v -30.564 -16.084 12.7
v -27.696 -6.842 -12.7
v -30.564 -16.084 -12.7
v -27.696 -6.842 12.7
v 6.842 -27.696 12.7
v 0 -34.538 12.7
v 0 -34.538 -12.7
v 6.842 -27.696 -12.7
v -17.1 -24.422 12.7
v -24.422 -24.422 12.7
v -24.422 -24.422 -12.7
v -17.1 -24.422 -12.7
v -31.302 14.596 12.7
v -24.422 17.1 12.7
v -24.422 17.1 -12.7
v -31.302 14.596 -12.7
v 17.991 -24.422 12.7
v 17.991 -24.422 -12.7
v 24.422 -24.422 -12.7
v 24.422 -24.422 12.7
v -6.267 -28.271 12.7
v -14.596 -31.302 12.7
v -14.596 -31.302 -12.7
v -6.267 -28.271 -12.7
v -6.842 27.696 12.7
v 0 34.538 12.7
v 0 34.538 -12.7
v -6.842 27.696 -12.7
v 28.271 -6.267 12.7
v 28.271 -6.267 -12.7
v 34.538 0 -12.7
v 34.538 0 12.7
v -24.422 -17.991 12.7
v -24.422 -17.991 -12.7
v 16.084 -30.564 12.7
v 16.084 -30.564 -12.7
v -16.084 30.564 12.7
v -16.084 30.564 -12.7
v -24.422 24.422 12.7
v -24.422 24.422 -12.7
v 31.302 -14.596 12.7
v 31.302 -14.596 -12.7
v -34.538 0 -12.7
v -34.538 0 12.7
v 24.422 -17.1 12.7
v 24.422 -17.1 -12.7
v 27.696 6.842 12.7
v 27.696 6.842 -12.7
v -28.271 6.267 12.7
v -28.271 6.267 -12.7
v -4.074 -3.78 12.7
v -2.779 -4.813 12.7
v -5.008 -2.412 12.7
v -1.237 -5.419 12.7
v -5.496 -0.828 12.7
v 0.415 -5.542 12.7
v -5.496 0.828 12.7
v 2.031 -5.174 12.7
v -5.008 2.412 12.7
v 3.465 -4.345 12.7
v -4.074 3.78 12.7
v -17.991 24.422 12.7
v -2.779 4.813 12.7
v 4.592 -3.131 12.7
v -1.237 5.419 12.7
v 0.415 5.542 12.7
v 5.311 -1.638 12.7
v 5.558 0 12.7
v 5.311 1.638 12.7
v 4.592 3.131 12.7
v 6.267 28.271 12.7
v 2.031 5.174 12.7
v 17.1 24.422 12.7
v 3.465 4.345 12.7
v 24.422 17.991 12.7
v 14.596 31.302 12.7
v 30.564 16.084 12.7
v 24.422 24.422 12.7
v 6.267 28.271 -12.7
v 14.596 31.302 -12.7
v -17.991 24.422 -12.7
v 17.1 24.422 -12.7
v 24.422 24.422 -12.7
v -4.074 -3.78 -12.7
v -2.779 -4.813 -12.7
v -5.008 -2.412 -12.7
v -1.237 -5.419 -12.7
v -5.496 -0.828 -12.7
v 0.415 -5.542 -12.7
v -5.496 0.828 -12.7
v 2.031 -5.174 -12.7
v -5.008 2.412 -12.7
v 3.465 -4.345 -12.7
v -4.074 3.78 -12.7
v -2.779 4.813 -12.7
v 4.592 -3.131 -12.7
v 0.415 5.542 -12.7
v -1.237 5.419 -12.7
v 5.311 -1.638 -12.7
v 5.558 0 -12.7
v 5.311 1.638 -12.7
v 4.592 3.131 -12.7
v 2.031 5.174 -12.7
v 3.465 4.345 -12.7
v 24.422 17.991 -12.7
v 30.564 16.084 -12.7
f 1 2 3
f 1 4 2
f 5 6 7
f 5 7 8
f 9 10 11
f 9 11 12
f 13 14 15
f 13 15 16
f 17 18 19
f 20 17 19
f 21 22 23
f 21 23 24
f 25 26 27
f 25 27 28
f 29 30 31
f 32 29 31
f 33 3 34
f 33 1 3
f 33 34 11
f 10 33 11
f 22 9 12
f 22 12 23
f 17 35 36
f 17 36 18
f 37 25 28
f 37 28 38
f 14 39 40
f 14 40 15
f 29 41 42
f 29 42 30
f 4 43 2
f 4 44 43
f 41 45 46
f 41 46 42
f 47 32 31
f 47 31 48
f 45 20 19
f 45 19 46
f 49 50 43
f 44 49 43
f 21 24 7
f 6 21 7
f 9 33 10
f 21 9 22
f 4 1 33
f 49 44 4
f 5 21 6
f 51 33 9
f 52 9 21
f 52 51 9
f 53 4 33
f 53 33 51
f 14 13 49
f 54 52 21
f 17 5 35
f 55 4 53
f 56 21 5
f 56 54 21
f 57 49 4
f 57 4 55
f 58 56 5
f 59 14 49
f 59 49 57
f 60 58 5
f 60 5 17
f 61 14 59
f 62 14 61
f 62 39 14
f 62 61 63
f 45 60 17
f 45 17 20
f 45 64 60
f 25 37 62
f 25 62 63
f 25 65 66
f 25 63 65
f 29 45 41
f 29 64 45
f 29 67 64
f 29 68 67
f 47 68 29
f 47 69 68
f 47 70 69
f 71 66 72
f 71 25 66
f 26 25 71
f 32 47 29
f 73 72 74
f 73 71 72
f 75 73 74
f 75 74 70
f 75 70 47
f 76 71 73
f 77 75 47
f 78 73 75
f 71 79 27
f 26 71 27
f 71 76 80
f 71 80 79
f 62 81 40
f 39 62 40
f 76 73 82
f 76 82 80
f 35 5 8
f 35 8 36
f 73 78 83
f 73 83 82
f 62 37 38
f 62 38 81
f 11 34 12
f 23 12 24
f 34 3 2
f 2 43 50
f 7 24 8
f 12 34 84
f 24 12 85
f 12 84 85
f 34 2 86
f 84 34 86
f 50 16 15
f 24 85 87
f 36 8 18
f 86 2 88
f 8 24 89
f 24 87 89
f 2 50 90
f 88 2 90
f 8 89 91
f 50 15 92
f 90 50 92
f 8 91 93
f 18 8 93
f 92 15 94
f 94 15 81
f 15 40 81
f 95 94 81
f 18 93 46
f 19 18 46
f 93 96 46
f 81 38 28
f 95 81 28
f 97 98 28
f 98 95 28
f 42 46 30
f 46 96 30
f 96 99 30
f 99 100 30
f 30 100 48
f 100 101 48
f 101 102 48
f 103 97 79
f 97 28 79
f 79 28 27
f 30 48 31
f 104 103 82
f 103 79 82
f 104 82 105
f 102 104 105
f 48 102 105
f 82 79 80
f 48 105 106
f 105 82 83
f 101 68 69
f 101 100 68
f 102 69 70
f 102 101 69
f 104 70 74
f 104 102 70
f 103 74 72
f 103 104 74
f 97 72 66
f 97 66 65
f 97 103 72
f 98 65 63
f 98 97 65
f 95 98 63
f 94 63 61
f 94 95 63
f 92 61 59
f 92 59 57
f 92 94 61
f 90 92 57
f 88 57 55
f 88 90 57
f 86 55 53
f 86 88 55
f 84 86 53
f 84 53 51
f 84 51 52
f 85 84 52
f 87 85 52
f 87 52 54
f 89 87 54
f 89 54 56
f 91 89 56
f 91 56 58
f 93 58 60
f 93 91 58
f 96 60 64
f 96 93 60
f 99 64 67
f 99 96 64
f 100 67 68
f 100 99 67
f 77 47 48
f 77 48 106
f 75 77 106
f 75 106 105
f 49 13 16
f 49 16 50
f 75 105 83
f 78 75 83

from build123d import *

# Parameters (mm, degrees)
F0_R     = 5.5579508341
F1_DEPTH = 12.7


with BuildPart() as f1:
    # F0 (on Top) → F1 (new body, symmetric)
    with BuildSketch(Plane.XY):
        with BuildLine():
            ThreePointArc((27.919055077, -5.3017102181), (28.2929762045, -2.6625673927), (28.4179831732, 0))
            ThreePointArc((28.4179831732, 0), (28.2207898632, 3.3419735383), (27.6319465947, 6.6375669502))
            ThreePointArc((27.6319465947, 6.6375669502), (27.588477608, 6.8159864218), (27.5438565796, 6.9941212708))
            ThreePointArc((27.5438565796, 6.9941212708), (20.0945486094, 20.0945486094), (6.9941212708, 27.5438565796))
            ThreePointArc((6.9941212708, 27.5438565796), (6.1507773069, 27.7443635024), (5.3017102181, 27.919055077))
            ThreePointArc((5.3017102181, 27.919055077), (2.6625673927, 28.2929762045), (0, 28.4179831732))
            ThreePointArc((0, 28.4179831732), (-3.3419735383, 28.2207898632), (-6.6375669502, 27.6319465947))
            ThreePointArc((-6.6375669502, 27.6319465947), (-6.8159864218, 27.588477608), (-6.9941212708, 27.5438565796))
            ThreePointArc((-6.9941212708, 27.5438565796), (-13.3962958665, 25.0623427613), (-19.0164091945, 21.1177164717))
            ThreePointArc((-19.0164091945, 21.1177164717), (-20.5718228566, 19.6056591827), (-22.0073683293, 17.9793633605))
            ThreePointArc((-22.0073683293, 17.9793633605), (-25.3771522917, 12.7899143545), (-27.5438565796, 6.9941212708))
            ThreePointArc((-27.5438565796, 6.9941212708), (-27.7443635024, 6.1507773069), (-27.919055077, 5.3017102181))
            ThreePointArc((-27.919055077, 5.3017102181), (-28.409770001, -0.6831808855), (-27.6319465947, -6.6375669502))
            ThreePointArc((-27.6319465947, -6.6375669502), (-27.588477608, -6.8159864218), (-27.5438565796, -6.9941212708))
            ThreePointArc((-27.5438565796, -6.9941212708), (-26.2547930089, -10.8750913416), (-24.4220383465, -14.5308571885))
            ThreePointArc((-24.4220383465, -14.5308571885), (-22.8800647164, -16.8548036537), (-21.1177164717, -19.0164091945))
            ThreePointArc((-21.1177164717, -19.0164091945), (-19.6056591827, -20.5718228566), (-17.9793633605, -22.0073683293))
            ThreePointArc((-17.9793633605, -22.0073683293), (-16.2998855168, -23.2786490109), (-14.5308571885, -24.4220383465))
            ThreePointArc((-14.5308571885, -24.4220383465), (-10.8750913416, -26.2547930089), (-6.9941212708, -27.5438565796))
            ThreePointArc((-6.9941212708, -27.5438565796), (-6.1507773069, -27.7443635024), (-5.3017102181, -27.919055077))
            ThreePointArc((-5.3017102181, -27.919055077), (-2.6625673927, -28.2929762045), (0, -28.4179831732))
            ThreePointArc((0, -28.4179831732), (3.3419735383, -28.2207898632), (6.6375669502, -27.6319465947))
            ThreePointArc((6.6375669502, -27.6319465947), (6.8159864218, -27.588477608), (6.9941212708, -27.5438565796))
            ThreePointArc((6.9941212708, -27.5438565796), (10.8750913416, -26.2547930089), (14.5308571885, -24.4220383465))
            ThreePointArc((14.5308571885, -24.4220383465), (16.8548036537, -22.8800647164), (19.0164091945, -21.1177164717))
            ThreePointArc((19.0164091945, -21.1177164717), (20.5718228566, -19.6056591827), (22.0073683293, -17.9793633605))
            ThreePointArc((22.0073683293, -17.9793633605), (23.2786490109, -16.2998855168), (24.4220383465, -14.5308571885))
            ThreePointArc((24.4220383465, -14.5308571885), (26.2547930089, -10.8750913416), (27.5438565796, -6.9941212708))
            ThreePointArc((27.5438565796, -6.9941212708), (27.7443635024, -6.1507773069), (27.919055077, -5.3017102181))
        make_face()
        Circle(F0_R, mode=Mode.SUBTRACT)
        with BuildLine():
            ThreePointArc((27.6319465947, 6.6375669502), (28.2207898632, 3.3419735383), (28.4179831732, 0))
            ThreePointArc((28.4179831732, 0), (28.2929762045, -2.6625673927), (27.919055077, -5.3017102181))
            Line((27.919055077, -5.3017102181), (28.2705482037, -6.2674296468))
            Line((28.2705482037, -6.2674296468), (34.5379778505, 0))
            Line((34.5379778505, 0), (27.6955405475, 6.8424373029))
            Line((27.6955405475, 6.8424373029), (27.6319465947, 6.6375669502))
        make_face()
        with BuildLine():
            ThreePointArc((27.5438565796, 6.9941212708), (27.588477608, 6.8159864218), (27.6319465947, 6.6375669502))
            Line((27.6319465947, 6.6375669502), (27.6955405475, 6.8424373029))
            Line((27.6955405475, 6.8424373029), (27.5438565796, 6.9941212708))
        make_face()
        with BuildLine():
            Line((28.2705482037, -6.2674296468), (27.919055077, -5.3017102181))
            ThreePointArc((27.919055077, -5.3017102181), (27.7443635024, -6.1507773069), (27.5438565796, -6.9941212708))
            Line((27.5438565796, -6.9941212708), (28.2705482037, -6.2674296468))
        make_face()
        with BuildLine():
            ThreePointArc((6.9941212708, 27.5438565796), (20.0945486094, 20.0945486094), (27.5438565796, 6.9941212708))
            Line((27.5438565796, 6.9941212708), (27.6955405475, 6.8424373029))
            Line((27.6955405475, 6.8424373029), (30.5642526553, 16.0841031339))
            Line((30.5642526553, 16.0841031339), (24.4220383465, 17.9907122754))
            Line((24.4220383465, 17.9907122754), (24.4220383465, 24.4220383465))
            Line((24.4220383465, 24.4220383465), (17.1004953487, 24.4220383465))
            Line((17.1004953487, 24.4220383465), (14.5963801632, 31.3020382744))
            Line((14.5963801632, 31.3020382744), (6.2674296468, 28.2705482037))
            Line((6.2674296468, 28.2705482037), (6.9941212708, 27.5438565796))
        make_face()
        with BuildLine():
            Line((28.2705482037, -6.2674296468), (27.5438565796, -6.9941212708))
            ThreePointArc((27.5438565796, -6.9941212708), (26.2547930089, -10.8750913416), (24.4220383465, -14.5308571885))
            Line((24.4220383465, -14.5308571885), (24.4220383465, -17.1004953487))
            Line((24.4220383465, -17.1004953487), (31.3020382744, -14.5963801632))
            Line((31.3020382744, -14.5963801632), (28.2705482037, -6.2674296468))
        make_face()
        with BuildLine():
            ThreePointArc((5.3017102181, 27.919055077), (6.1507773069, 27.7443635024), (6.9941212708, 27.5438565796))
            Line((6.9941212708, 27.5438565796), (6.2674296468, 28.2705482037))
            Line((6.2674296468, 28.2705482037), (5.3017102181, 27.919055077))
        make_face()
        with BuildLine():
            Line((24.4220383465, -17.1004953487), (24.4220383465, -14.5308571885))
            ThreePointArc((24.4220383465, -14.5308571885), (23.2786490109, -16.2998855168), (22.0073683293, -17.9793633605))
            Line((22.0073683293, -17.9793633605), (24.4220383465, -17.1004953487))
        make_face()
        with BuildLine():
            ThreePointArc((0, 28.4179831732), (2.6625673927, 28.2929762045), (5.3017102181, 27.919055077))
            Line((5.3017102181, 27.919055077), (6.2674296468, 28.2705482037))
            Line((6.2674296468, 28.2705482037), (0, 34.5379778505))
            Line((0, 34.5379778505), (-6.8424373029, 27.6955405475))
            Line((-6.8424373029, 27.6955405475), (-6.6375669502, 27.6319465947))
            ThreePointArc((-6.6375669502, 27.6319465947), (-3.3419735383, 28.2207898632), (0, 28.4179831732))
        make_face()
        with BuildLine():
            Line((24.4220383465, -17.1004953487), (22.0073683293, -17.9793633605))
            ThreePointArc((22.0073683293, -17.9793633605), (20.5718228566, -19.6056591827), (19.0164091945, -21.1177164717))
            Line((19.0164091945, -21.1177164717), (17.9907122754, -24.4220383465))
            Line((17.9907122754, -24.4220383465), (24.4220383465, -24.4220383465))
            Line((24.4220383465, -24.4220383465), (24.4220383465, -17.1004953487))
        make_face()
        with BuildLine():
            Line((17.9907122754, -24.4220383465), (19.0164091945, -21.1177164717))
            ThreePointArc((19.0164091945, -21.1177164717), (16.8548036537, -22.8800647164), (14.5308571885, -24.4220383465))
            Line((14.5308571885, -24.4220383465), (17.9907122754, -24.4220383465))
        make_face()
        with BuildLine():
            ThreePointArc((-6.9941212708, 27.5438565796), (-6.8159864218, 27.588477608), (-6.6375669502, 27.6319465947))
            Line((-6.6375669502, 27.6319465947), (-6.8424373029, 27.6955405475))
            Line((-6.8424373029, 27.6955405475), (-6.9941212708, 27.5438565796))
        make_face()
        with BuildLine():
            Line((-6.9941212708, 27.5438565796), (-6.8424373029, 27.6955405475))
            Line((-6.8424373029, 27.6955405475), (-16.0841031339, 30.5642526553))
            Line((-16.0841031339, 30.5642526553), (-17.9907122754, 24.4220383465))
            Line((-17.9907122754, 24.4220383465), (-24.4220383465, 24.4220383465))
            Line((-24.4220383465, 24.4220383465), (-24.4220383465, 17.1004953487))
            Line((-24.4220383465, 17.1004953487), (-31.3020382744, 14.5963801632))
            Line((-31.3020382744, 14.5963801632), (-28.2705482037, 6.2674296468))
            Line((-28.2705482037, 6.2674296468), (-27.5438565796, 6.9941212708))
            ThreePointArc((-27.5438565796, 6.9941212708), (-25.3771522917, 12.7899143545), (-22.0073683293, 17.9793633605))
            ThreePointArc((-22.0073683293, 17.9793633605), (-20.5718228566, 19.6056591827), (-19.0164091945, 21.1177164717))
            ThreePointArc((-19.0164091945, 21.1177164717), (-13.3962958665, 25.0623427613), (-6.9941212708, 27.5438565796))
        make_face()
        with BuildLine():
            Line((17.9907122754, -24.4220383465), (14.5308571885, -24.4220383465))
            ThreePointArc((14.5308571885, -24.4220383465), (10.8750913416, -26.2547930089), (6.9941212708, -27.5438565796))
            Line((6.9941212708, -27.5438565796), (6.8424373029, -27.6955405475))
            Line((6.8424373029, -27.6955405475), (16.0841031339, -30.5642526553))
            Line((16.0841031339, -30.5642526553), (17.9907122754, -24.4220383465))
        make_face()
        with BuildLine():
            Line((6.8424373029, -27.6955405475), (6.9941212708, -27.5438565796))
            ThreePointArc((6.9941212708, -27.5438565796), (6.8159864218, -27.588477608), (6.6375669502, -27.6319465947))
            Line((6.6375669502, -27.6319465947), (6.8424373029, -27.6955405475))
        make_face()
        with BuildLine():
            Line((6.8424373029, -27.6955405475), (6.6375669502, -27.6319465947))
            ThreePointArc((6.6375669502, -27.6319465947), (3.3419735383, -28.2207898632), (0, -28.4179831732))
            ThreePointArc((0, -28.4179831732), (-2.6625673927, -28.2929762045), (-5.3017102181, -27.919055077))
            Line((-5.3017102181, -27.919055077), (-6.2674296468, -28.2705482037))
            Line((-6.2674296468, -28.2705482037), (0, -34.5379778505))
            Line((0, -34.5379778505), (6.8424373029, -27.6955405475))
        make_face()
        with BuildLine():
            ThreePointArc((-27.919055077, 5.3017102181), (-27.7443635024, 6.1507773069), (-27.5438565796, 6.9941212708))
            Line((-27.5438565796, 6.9941212708), (-28.2705482037, 6.2674296468))
            Line((-28.2705482037, 6.2674296468), (-27.919055077, 5.3017102181))
        make_face()
        with BuildLine():
            Line((-6.2674296468, -28.2705482037), (-5.3017102181, -27.919055077))
            ThreePointArc((-5.3017102181, -27.919055077), (-6.1507773069, -27.7443635024), (-6.9941212708, -27.5438565796))
            Line((-6.9941212708, -27.5438565796), (-6.2674296468, -28.2705482037))
        make_face()
        with BuildLine():
            Line((-14.5963801632, -31.3020382744), (-6.2674296468, -28.2705482037))
            Line((-6.2674296468, -28.2705482037), (-6.9941212708, -27.5438565796))
            ThreePointArc((-6.9941212708, -27.5438565796), (-10.8750913416, -26.2547930089), (-14.5308571885, -24.4220383465))
            Line((-14.5308571885, -24.4220383465), (-17.1004953487, -24.4220383465))
            Line((-17.1004953487, -24.4220383465), (-14.5963801632, -31.3020382744))
        make_face()
        with BuildLine():
            ThreePointArc((-27.6319465947, -6.6375669502), (-28.409770001, -0.6831808855), (-27.919055077, 5.3017102181))
            Line((-27.919055077, 5.3017102181), (-28.2705482037, 6.2674296468))
            Line((-28.2705482037, 6.2674296468), (-34.5379778505, 0))
            Line((-34.5379778505, 0), (-27.6955405475, -6.8424373029))
            Line((-27.6955405475, -6.8424373029), (-27.6319465947, -6.6375669502))
        make_face()
        with BuildLine():
            ThreePointArc((-27.5438565796, -6.9941212708), (-27.588477608, -6.8159864218), (-27.6319465947, -6.6375669502))
            Line((-27.6319465947, -6.6375669502), (-27.6955405475, -6.8424373029))
            Line((-27.6955405475, -6.8424373029), (-27.5438565796, -6.9941212708))
        make_face()
        with BuildLine():
            Line((-17.1004953487, -24.4220383465), (-14.5308571885, -24.4220383465))
            ThreePointArc((-14.5308571885, -24.4220383465), (-16.2998855168, -23.2786490109), (-17.9793633605, -22.0073683293))
            Line((-17.9793633605, -22.0073683293), (-17.1004953487, -24.4220383465))
        make_face()
        with BuildLine():
            Line((-24.4220383465, -24.4220383465), (-17.1004953487, -24.4220383465))
            Line((-17.1004953487, -24.4220383465), (-17.9793633605, -22.0073683293))
            ThreePointArc((-17.9793633605, -22.0073683293), (-19.6056591827, -20.5718228566), (-21.1177164717, -19.0164091945))
            Line((-21.1177164717, -19.0164091945), (-24.4220383465, -17.9907122754))
            Line((-24.4220383465, -17.9907122754), (-24.4220383465, -24.4220383465))
        make_face()
        with BuildLine():
            ThreePointArc((-24.4220383465, -14.5308571885), (-26.2547930089, -10.8750913416), (-27.5438565796, -6.9941212708))
            Line((-27.5438565796, -6.9941212708), (-27.6955405475, -6.8424373029))
            Line((-27.6955405475, -6.8424373029), (-30.5642526553, -16.0841031339))
            Line((-30.5642526553, -16.0841031339), (-24.4220383465, -17.9907122754))
            Line((-24.4220383465, -17.9907122754), (-24.4220383465, -14.5308571885))
        make_face()
        with BuildLine():
            ThreePointArc((-21.1177164717, -19.0164091945), (-22.8800647164, -16.8548036537), (-24.4220383465, -14.5308571885))
            Line((-24.4220383465, -14.5308571885), (-24.4220383465, -17.9907122754))
            Line((-24.4220383465, -17.9907122754), (-21.1177164717, -19.0164091945))
        make_face()
    extrude(amount=F1_DEPTH, both=True)


solid = f1.part
